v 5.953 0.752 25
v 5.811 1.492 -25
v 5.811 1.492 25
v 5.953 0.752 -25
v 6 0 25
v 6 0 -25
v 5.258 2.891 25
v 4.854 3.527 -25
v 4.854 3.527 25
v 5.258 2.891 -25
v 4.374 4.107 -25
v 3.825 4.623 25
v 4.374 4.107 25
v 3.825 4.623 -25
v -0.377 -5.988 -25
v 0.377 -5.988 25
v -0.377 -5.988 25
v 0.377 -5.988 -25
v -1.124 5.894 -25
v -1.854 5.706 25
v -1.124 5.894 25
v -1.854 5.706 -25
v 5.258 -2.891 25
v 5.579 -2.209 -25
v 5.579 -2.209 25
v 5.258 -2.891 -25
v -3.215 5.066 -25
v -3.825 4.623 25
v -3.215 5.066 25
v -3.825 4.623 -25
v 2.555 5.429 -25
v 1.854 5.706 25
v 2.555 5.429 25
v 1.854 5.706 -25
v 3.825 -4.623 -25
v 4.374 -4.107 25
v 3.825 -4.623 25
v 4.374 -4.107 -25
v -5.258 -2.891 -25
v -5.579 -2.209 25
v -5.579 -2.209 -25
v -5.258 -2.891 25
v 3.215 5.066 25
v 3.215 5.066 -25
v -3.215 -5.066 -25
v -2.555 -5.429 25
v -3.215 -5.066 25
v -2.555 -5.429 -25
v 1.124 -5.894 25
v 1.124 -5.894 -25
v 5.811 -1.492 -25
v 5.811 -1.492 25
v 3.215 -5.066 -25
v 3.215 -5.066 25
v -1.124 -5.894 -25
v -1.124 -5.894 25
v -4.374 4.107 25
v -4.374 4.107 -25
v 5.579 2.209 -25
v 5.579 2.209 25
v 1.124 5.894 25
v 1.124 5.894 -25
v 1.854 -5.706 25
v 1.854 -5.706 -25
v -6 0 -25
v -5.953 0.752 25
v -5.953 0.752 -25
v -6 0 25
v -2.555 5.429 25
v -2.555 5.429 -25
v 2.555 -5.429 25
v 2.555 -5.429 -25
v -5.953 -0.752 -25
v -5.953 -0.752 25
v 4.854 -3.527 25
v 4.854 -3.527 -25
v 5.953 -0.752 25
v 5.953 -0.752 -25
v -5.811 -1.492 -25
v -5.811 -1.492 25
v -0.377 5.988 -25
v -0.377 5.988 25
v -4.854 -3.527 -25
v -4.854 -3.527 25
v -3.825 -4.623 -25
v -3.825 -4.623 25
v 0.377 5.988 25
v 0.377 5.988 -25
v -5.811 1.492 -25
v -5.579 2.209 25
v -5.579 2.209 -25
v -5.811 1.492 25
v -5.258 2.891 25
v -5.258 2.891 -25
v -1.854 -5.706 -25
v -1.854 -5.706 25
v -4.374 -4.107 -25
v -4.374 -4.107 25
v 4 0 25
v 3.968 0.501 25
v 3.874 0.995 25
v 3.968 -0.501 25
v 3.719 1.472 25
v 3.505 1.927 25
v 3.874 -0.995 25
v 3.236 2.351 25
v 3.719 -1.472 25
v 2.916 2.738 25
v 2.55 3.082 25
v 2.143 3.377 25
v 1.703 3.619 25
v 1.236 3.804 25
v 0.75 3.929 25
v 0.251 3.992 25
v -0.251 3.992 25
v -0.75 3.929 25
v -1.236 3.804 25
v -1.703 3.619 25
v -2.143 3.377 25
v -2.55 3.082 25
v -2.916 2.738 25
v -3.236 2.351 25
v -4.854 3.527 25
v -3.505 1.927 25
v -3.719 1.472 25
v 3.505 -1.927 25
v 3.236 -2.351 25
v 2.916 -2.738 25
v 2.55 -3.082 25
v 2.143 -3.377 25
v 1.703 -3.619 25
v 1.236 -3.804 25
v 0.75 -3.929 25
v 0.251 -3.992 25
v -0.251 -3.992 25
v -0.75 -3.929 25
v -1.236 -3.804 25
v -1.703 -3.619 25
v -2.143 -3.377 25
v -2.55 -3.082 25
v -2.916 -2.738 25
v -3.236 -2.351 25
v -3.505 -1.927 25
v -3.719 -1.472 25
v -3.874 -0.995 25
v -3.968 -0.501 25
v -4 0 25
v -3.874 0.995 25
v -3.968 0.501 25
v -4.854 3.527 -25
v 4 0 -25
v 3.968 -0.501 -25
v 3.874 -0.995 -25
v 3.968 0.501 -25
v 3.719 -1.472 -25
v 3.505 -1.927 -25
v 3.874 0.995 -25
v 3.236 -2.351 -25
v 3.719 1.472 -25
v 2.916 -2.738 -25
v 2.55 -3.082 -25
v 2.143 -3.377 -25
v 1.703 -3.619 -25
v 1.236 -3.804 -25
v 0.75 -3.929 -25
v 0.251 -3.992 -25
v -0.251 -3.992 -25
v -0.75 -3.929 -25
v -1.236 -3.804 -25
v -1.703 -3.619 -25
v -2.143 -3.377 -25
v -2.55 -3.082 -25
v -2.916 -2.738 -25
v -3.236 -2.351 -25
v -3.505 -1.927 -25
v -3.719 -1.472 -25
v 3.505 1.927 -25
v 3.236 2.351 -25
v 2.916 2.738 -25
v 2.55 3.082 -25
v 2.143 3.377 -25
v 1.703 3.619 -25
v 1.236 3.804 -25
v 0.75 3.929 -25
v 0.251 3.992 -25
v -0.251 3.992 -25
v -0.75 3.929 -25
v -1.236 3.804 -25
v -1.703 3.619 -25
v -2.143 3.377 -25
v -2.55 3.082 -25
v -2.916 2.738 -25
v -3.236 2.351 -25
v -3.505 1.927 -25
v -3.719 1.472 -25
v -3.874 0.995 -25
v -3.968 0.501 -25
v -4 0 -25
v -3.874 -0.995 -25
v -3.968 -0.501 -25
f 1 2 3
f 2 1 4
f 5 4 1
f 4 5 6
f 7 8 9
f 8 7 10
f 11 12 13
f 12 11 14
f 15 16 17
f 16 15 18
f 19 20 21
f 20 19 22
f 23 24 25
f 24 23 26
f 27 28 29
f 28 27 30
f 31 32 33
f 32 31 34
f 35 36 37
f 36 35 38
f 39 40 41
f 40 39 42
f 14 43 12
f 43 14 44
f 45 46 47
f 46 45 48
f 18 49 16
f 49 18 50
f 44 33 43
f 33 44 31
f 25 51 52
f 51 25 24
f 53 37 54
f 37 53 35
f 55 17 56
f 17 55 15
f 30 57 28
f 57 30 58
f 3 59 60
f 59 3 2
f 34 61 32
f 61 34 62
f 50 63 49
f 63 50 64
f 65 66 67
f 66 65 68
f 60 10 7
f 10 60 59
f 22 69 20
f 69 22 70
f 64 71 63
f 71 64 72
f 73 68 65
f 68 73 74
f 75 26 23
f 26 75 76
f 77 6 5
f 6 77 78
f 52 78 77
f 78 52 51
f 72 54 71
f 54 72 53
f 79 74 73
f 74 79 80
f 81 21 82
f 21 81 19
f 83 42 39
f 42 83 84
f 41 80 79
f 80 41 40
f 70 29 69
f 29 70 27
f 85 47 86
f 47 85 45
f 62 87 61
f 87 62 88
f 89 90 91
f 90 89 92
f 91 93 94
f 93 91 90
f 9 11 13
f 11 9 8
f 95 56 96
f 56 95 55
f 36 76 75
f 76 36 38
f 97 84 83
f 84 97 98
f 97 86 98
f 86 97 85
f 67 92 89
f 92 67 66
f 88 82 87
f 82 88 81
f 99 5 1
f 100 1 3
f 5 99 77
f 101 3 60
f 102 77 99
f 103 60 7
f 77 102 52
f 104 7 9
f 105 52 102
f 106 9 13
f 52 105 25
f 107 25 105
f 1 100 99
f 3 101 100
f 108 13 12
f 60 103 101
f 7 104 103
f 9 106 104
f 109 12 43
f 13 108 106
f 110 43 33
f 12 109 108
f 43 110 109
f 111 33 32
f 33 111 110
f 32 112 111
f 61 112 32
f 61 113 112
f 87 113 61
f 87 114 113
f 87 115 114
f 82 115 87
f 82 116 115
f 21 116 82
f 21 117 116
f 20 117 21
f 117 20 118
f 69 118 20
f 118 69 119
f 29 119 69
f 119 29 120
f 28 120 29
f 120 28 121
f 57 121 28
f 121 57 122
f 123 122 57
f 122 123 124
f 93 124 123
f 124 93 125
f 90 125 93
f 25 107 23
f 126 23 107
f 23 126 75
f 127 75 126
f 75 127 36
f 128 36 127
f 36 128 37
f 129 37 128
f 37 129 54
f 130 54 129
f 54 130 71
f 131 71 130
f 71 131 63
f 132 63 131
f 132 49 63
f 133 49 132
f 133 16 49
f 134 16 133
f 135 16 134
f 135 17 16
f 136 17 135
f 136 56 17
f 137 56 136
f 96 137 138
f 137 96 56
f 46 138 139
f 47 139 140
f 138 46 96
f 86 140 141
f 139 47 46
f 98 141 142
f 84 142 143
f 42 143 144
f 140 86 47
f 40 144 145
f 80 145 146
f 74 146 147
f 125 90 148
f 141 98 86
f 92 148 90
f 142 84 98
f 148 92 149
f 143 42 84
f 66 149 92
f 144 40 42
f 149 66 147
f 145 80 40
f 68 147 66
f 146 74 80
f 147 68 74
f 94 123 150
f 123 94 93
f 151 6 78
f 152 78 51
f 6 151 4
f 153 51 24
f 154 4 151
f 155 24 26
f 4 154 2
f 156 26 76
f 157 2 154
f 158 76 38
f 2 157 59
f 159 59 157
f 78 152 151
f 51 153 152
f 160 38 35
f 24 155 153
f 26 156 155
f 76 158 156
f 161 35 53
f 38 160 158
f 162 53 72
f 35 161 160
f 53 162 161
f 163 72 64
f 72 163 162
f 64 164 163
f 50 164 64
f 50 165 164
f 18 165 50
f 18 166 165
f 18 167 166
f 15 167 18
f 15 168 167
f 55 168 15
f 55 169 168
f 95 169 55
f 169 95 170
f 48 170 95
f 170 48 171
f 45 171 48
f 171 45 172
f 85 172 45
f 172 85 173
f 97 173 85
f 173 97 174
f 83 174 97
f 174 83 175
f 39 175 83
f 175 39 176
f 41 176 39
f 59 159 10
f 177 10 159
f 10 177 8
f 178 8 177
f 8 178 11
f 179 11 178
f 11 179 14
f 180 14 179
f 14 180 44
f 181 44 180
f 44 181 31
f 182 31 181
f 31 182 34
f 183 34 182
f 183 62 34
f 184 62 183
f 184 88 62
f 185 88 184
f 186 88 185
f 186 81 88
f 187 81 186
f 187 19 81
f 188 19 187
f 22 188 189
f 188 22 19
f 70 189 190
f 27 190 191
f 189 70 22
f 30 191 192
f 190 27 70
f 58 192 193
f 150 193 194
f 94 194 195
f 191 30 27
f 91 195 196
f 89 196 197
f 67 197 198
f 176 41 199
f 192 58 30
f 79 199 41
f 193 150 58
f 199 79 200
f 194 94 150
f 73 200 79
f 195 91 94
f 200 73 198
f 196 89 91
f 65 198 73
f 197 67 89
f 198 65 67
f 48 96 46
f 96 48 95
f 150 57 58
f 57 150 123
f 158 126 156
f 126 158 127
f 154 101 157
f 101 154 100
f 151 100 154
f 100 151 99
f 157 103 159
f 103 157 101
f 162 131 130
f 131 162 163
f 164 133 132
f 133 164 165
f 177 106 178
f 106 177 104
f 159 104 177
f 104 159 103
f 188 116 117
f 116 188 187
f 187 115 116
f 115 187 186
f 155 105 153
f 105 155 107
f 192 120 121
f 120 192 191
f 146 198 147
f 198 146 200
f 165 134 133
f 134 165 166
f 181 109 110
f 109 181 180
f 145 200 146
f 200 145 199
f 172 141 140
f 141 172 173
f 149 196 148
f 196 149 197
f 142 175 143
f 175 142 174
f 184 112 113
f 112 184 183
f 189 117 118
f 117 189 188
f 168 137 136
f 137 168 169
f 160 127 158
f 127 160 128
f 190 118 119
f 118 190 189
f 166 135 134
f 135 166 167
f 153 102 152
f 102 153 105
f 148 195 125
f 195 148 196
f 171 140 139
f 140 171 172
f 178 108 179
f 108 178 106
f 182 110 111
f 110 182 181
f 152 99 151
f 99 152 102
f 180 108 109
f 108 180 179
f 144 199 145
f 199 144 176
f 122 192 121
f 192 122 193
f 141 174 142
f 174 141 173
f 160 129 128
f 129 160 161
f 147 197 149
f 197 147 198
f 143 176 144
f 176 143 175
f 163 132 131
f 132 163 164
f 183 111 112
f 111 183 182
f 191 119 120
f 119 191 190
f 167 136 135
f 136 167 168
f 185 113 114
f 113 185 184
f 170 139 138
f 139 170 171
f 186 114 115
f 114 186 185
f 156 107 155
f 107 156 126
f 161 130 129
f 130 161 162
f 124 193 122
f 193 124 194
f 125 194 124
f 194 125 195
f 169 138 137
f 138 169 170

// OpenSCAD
$fn = 50;


difference() {
	union() {
		translate(v = [0, 0, -25.0000000000]) {
			cylinder(h = 50, r = 6.0000000000);
		}
	}
	union() {
		translate(v = [0, 0, -100.0000000000]) {
			cylinder(h = 200, r = 4.0000000000);
		}
	}
}
